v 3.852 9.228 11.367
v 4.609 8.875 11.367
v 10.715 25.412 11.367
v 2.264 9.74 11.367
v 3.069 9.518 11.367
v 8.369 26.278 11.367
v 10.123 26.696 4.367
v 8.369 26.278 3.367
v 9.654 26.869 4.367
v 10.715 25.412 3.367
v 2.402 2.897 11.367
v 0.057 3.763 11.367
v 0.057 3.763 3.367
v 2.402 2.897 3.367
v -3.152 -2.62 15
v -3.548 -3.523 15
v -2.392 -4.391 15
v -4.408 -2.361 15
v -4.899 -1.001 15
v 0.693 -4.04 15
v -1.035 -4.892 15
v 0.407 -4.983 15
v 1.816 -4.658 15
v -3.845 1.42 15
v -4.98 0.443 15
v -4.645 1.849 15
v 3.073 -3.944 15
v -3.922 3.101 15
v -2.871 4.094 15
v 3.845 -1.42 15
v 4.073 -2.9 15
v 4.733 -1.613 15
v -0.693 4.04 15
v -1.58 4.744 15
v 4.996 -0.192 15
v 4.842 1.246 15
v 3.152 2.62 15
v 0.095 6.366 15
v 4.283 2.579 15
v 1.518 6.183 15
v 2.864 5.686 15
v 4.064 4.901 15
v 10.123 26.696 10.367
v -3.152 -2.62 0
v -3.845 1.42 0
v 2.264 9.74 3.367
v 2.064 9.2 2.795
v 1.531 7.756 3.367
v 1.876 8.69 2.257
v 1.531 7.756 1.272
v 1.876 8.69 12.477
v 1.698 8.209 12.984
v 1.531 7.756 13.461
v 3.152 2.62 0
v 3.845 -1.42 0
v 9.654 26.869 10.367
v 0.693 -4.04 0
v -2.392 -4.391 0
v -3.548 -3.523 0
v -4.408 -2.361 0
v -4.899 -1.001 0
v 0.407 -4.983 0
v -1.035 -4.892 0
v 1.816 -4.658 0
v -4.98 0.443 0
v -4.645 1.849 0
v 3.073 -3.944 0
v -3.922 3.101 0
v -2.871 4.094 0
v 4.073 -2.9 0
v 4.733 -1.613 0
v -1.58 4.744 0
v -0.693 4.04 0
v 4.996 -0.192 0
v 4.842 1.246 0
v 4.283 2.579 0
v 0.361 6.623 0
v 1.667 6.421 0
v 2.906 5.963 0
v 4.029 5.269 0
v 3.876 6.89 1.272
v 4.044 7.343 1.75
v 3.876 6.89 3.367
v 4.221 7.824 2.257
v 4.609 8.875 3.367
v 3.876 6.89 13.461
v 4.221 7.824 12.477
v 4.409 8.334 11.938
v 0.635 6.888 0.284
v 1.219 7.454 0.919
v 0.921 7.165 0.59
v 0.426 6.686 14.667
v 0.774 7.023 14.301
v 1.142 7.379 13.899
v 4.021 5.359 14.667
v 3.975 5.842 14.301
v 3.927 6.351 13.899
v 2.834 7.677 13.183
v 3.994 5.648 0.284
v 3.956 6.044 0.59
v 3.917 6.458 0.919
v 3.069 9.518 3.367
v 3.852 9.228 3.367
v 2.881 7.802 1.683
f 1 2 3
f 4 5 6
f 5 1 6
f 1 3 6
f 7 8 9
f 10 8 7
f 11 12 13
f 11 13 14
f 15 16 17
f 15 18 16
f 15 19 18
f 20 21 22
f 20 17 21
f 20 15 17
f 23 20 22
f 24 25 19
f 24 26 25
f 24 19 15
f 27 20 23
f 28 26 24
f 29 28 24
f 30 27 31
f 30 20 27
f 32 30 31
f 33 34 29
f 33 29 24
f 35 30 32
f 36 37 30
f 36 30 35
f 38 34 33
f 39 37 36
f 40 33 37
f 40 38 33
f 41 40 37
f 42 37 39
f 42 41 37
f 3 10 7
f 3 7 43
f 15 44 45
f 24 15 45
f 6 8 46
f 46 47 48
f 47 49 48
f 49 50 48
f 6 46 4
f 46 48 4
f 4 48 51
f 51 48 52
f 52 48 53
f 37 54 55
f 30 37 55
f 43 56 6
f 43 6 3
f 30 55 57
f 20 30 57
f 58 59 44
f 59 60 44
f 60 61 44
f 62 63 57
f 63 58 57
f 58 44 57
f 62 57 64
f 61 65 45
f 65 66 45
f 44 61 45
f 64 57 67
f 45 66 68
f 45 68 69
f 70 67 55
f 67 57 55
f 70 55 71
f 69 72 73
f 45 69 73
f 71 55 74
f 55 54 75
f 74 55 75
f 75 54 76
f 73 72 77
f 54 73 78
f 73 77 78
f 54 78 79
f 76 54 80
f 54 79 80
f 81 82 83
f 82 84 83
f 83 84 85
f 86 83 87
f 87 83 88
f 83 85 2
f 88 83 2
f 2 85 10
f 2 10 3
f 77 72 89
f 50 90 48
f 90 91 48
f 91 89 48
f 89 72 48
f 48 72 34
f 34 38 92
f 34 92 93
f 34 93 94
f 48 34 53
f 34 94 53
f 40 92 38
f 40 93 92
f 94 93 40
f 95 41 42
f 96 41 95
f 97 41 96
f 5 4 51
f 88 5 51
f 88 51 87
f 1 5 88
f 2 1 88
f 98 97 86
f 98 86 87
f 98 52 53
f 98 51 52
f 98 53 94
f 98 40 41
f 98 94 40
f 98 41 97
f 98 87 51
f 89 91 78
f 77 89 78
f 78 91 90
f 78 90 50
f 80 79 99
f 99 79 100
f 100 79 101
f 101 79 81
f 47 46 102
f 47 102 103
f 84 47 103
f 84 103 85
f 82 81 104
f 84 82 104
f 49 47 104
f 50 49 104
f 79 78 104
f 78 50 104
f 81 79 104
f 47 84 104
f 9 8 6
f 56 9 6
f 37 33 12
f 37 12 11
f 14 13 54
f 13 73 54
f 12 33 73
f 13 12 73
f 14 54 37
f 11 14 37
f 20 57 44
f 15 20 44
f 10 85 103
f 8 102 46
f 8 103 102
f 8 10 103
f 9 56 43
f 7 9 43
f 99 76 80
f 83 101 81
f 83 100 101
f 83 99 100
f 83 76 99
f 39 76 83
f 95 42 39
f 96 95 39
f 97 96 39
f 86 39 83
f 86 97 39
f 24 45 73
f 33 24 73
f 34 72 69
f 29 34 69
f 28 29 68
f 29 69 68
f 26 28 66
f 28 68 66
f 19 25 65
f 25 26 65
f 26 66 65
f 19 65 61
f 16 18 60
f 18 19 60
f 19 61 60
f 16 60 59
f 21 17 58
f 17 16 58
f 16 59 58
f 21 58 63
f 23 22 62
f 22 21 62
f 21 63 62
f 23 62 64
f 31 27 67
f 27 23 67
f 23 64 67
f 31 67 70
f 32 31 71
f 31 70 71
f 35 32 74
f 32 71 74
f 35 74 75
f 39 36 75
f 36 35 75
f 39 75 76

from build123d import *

# Parameters (mm, degrees)
F0_R         = 5
F1_DEPTH     = 15
F2_W         = 2.5
F2_H         = 8
F3_DEPTH     = 25
F4_T1_DEPTH  = 8
F4_T6_ANGLE  = 323.6604372277
F4_T13_ANGLE = 323.6604372277
F4_T21_ANGLE = 323.6604372277
F4_T26_DEPTH = 15.8662197745
F4_T34_ANGLE = 323.6604372277
F4_T39_DEPTH = 15.8662197745
F4_T47_DEPTH = 15.8662197745
F4_T52_ANGLE = 323.6604372277
F4_T60_ANGLE = 323.6604372277
F4_T65_DEPTH = 15.8662197745
F5_SIZE      = 1


# Not quite as in the source:
# - a fillet or chamfer that OpenCascade refuses, or shapes differently, is made with other operations: its cross-section is extruded or revolved along the edge and cut away or added


with BuildPart() as f1:
    # F0 (on Top) → F1 (new body)
    with BuildSketch(Plane.XY):
        Circle(F0_R)
        Polygon((3.1522870356, 2.6203854256), (3.8454638641, -1.4197679401), (0.6931768285, -4.0401533656), (-3.1522870356, -2.6203854256), (-3.8454638641, 1.4197679401), (-0.6931768285, 4.0401533656), align=None, mode=Mode.SUBTRACT)
    extrude(amount=F1_DEPTH)

    # F2 (on face) → F3 (join)
    with BuildSketch(Plane(origin=(1.2295551036, 3.3302693956, 0), x_dir=(0.9381040551, -0.3463535503, 0), z_dir=(-0.3463535503, -0.9381040551, 0))):
        with Locations((0, 7.3666626269)):
            Rectangle(F2_W, F2_H)
    extrude(amount=-F3_DEPTH)

    # F4: chamfer of 5 on 4 edges, made by hand

    # F4_s2 → F4_t1 (join)
    with BuildSketch(Plane.XY.offset(3.3666626269)):
        with BuildLine():
            Line((-1.5797144045, 4.7438910612), (1.5310914666, 7.7560143709))
            Line((1.5310914666, 7.7560143709), (0.5041468464, 4.9745186659))
            ThreePointArc((0.5041468464, 4.9745186659), (-0.631305898, 4.9599851676), (-1.5797144045, 4.7438910612))
        make_face()
        with BuildLine():
            Line((4.2834359399, 2.5791813718), (3.8763516043, 6.8901304951))
            Line((3.8763516043, 6.8901304951), (2.8494069841, 4.1086347901))
            ThreePointArc((2.8494069841, 4.1086347901), (3.702995808, 3.359735413), (4.2834359399, 2.5791813718))
        make_face()
    extrude(amount=F4_T1_DEPTH)


with BuildPart() as f4_tool4:
    # F4_s5 → F4_t6 (revolve)
    with BuildSketch(Plane(origin=(0, 0, 0), x_dir=(0, 0, 1), z_dir=(0.7833222839, -0.6216157974, 0))):
        Polygon((16.3666626269, 5), (11.3666626269, 10), (11.3666626269, 5), align=None)
    revolve(axis=Axis((0, 0, 11.3666626269), (0, 0, -1)), revolution_arc=F4_T6_ANGLE)

    split(bisect_by=Plane.XY.offset(15), keep=Keep.BOTTOM)

    split(bisect_by=Plane(origin=(-1.1726300689, 0.4329419379, 0), x_dir=(0, 0, 1), z_dir=(0.9381040551, -0.3463535503, 0)), keep=Keep.TOP)

    split(bisect_by=Plane(origin=(1.1726300689, -0.4329419379, 0), x_dir=(0, 0, 1), z_dir=(-0.9381040551, 0.3463535503, 0)), keep=Keep.TOP)


with BuildPart() as f1_1:
    add(f1.part)

    # F4_t3: union F4_tool4
    add(f4_tool4.part)


with BuildPart() as f4_tool11:
    # F4_s12 → F4_t13 (revolve)
    with BuildSketch(Plane(origin=(0, 0, 0), x_dir=(0, 0, 1), z_dir=(0.7833222839, -0.6216157974, 0))):
        Polygon((-1.6333373731, 5), (3.3666626269, 10), (3.3666626269, 5), align=None)
    revolve(axis=Axis((0, 0, 3.3666626269), (0, 0, -1)), revolution_arc=F4_T13_ANGLE)

    split(bisect_by=Plane.XY, keep=Keep.TOP)

    split(bisect_by=Plane(origin=(-1.1726300689, 0.4329419379, 0), x_dir=(0, 0, 1), z_dir=(0.9381040551, -0.3463535503, 0)), keep=Keep.TOP)

    split(bisect_by=Plane(origin=(1.1726300689, -0.4329419379, 0), x_dir=(0, 0, 1), z_dir=(-0.9381040551, 0.3463535503, 0)), keep=Keep.TOP)


with BuildPart() as f1_2:
    add(f1_1.part)

    # F4_t10: union F4_tool11
    add(f4_tool11.part)


with BuildPart() as f4_tool19:
    # F4_s20 → F4_t21 (revolve)
    with BuildSketch(Plane(origin=(0, 0, 0), x_dir=(0, 0, 1), z_dir=(0.7833222839, -0.6216157974, 0))):
        Polygon((16.3666626269, 5), (11.3666626269, 10), (11.3666626269, 5), align=None)
    revolve(axis=Axis((0, 0, 11.3666626269), (0, 0, -1)), revolution_arc=F4_T21_ANGLE)

    split(bisect_by=Plane.XY.offset(15), keep=Keep.BOTTOM)

    split(bisect_by=Plane(origin=(-1.1726300689, 0.4329419379, 0), x_dir=(0, 0, 1), z_dir=(-0.9381040551, 0.3463535503, 0)), keep=Keep.TOP)


with BuildPart() as f4_tool24:
    # F4_s25 → F4_t26 (new body)
    with BuildSketch(Plane.XY.offset(19.2328824014)):
        with BuildLine():
            Line((-1.5797144045, 4.7438910612), (1.5310914666, 7.7560143709))
            Line((1.5310914666, 7.7560143709), (0.5041468464, 4.9745186659))
            ThreePointArc((0.5041468464, 4.9745186659), (-0.631305898, 4.9599851676), (-1.5797144045, 4.7438910612))
        make_face()
    extrude(amount=-F4_T26_DEPTH)

    split(bisect_by=Plane.XY.offset(15), keep=Keep.BOTTOM)

    split(bisect_by=Plane.XY.offset(11.3666626269), keep=Keep.TOP)


with BuildPart() as f4_tool19_1:
    add(f4_tool19.part)

    # F4_t29: intersect F4_tool24
    add(f4_tool24.part, mode=Mode.INTERSECT)


with BuildPart() as f1_3:
    add(f1_2.part)

    # F4_t17: union F4_tool19
    add(f4_tool19_1.part)


with BuildPart() as f4_tool32:
    # F4_s33 → F4_t34 (revolve)
    with BuildSketch(Plane(origin=(0, 0, 0), x_dir=(0, 0, 1), z_dir=(0.7833222839, -0.6216157974, 0))):
        Polygon((16.3666626269, 5), (11.3666626269, 10), (11.3666626269, 5), align=None)
    revolve(axis=Axis((0, 0, 11.3666626269), (0, 0, -1)), revolution_arc=F4_T34_ANGLE)

    split(bisect_by=Plane.XY.offset(15), keep=Keep.BOTTOM)

    split(bisect_by=Plane(origin=(1.1726300689, -0.4329419379, 0), x_dir=(0, 0, 1), z_dir=(0.9381040551, -0.3463535503, 0)), keep=Keep.TOP)


with BuildPart() as f4_tool37:
    # F4_s38 → F4_t39 (new body)
    with BuildSketch(Plane.XY.offset(19.2328824014)):
        with BuildLine():
            Line((4.2834359399, 2.5791813718), (3.8763516043, 6.8901304951))
            Line((3.8763516043, 6.8901304951), (2.8494069841, 4.1086347901))
            ThreePointArc((2.8494069841, 4.1086347901), (3.702995808, 3.359735413), (4.2834359399, 2.5791813718))
        make_face()
    extrude(amount=-F4_T39_DEPTH)

    split(bisect_by=Plane.XY.offset(15), keep=Keep.BOTTOM)

    split(bisect_by=Plane.XY.offset(11.3666626269), keep=Keep.TOP)


with BuildPart() as f4_tool32_1:
    add(f4_tool32.part)

    # F4_t42: intersect F4_tool37
    add(f4_tool37.part, mode=Mode.INTERSECT)


with BuildPart() as f1_4:
    add(f1_3.part)

    # F4_t30: union F4_tool32
    add(f4_tool32_1.part)


with BuildPart() as f4_tool45:
    # F4_s46 → F4_t47 (new body)
    with BuildSketch(Plane.XY.offset(11.3666626269)):
        with BuildLine():
            Line((-1.5797144045, 4.7438910612), (1.5310914666, 7.7560143709))
            Line((1.5310914666, 7.7560143709), (0.5041468464, 4.9745186659))
            ThreePointArc((0.5041468464, 4.9745186659), (-0.631305898, 4.9599851676), (-1.5797144045, 4.7438910612))
        make_face()
    extrude(amount=-F4_T47_DEPTH)

    split(bisect_by=Plane.XY, keep=Keep.TOP)

    split(bisect_by=Plane.XY.offset(3.3666626269), keep=Keep.BOTTOM)


with BuildPart() as f4_tool50:
    # F4_s51 → F4_t52 (revolve)
    with BuildSketch(Plane(origin=(0, 0, 0), x_dir=(0, 0, 1), z_dir=(0.7833222839, -0.6216157974, 0))):
        Polygon((-1.6333373731, 5), (3.3666626269, 10), (3.3666626269, 5), align=None)
    revolve(axis=Axis((0, 0, 3.3666626269), (0, 0, -1)), revolution_arc=F4_T52_ANGLE)

    split(bisect_by=Plane.XY, keep=Keep.TOP)

    split(bisect_by=Plane(origin=(-1.1726300689, 0.4329419379, 0), x_dir=(0, 0, 1), z_dir=(-0.9381040551, 0.3463535503, 0)), keep=Keep.TOP)


with BuildPart() as f4_tool45_1:
    add(f4_tool45.part)

    # F4_t55: intersect F4_tool50
    add(f4_tool50.part, mode=Mode.INTERSECT)


with BuildPart() as f1_5:
    add(f1_4.part)

    # F4_t43: union F4_tool45
    add(f4_tool45_1.part)


with BuildPart() as f4_tool58:
    # F4_s59 → F4_t60 (revolve)
    with BuildSketch(Plane(origin=(0, 0, 0), x_dir=(0, 0, 1), z_dir=(0.7833222839, -0.6216157974, 0))):
        Polygon((-1.6333373731, 5), (3.3666626269, 10), (3.3666626269, 5), align=None)
    revolve(axis=Axis((0, 0, 3.3666626269), (0, 0, -1)), revolution_arc=F4_T60_ANGLE)

    split(bisect_by=Plane.XY, keep=Keep.TOP)

    split(bisect_by=Plane(origin=(1.1726300689, -0.4329419379, 0), x_dir=(0, 0, 1), z_dir=(0.9381040551, -0.3463535503, 0)), keep=Keep.TOP)


with BuildPart() as f4_tool63:
    # F4_s64 → F4_t65 (new body)
    with BuildSketch(Plane.XY.offset(11.3666626269)):
        with BuildLine():
            Line((4.2834359399, 2.5791813718), (3.8763516043, 6.8901304951))
            Line((3.8763516043, 6.8901304951), (2.8494069841, 4.1086347901))
            ThreePointArc((2.8494069841, 4.1086347901), (3.702995808, 3.359735413), (4.2834359399, 2.5791813718))
        make_face()
    extrude(amount=-F4_T65_DEPTH)

    split(bisect_by=Plane.XY, keep=Keep.TOP)

    split(bisect_by=Plane.XY.offset(3.3666626269), keep=Keep.BOTTOM)


with BuildPart() as f4_tool58_1:
    add(f4_tool58.part)

    # F4_t68: intersect F4_tool63
    add(f4_tool63.part, mode=Mode.INTERSECT)


with BuildPart() as f1_6:
    add(f1_5.part)

    # F4_t56: union F4_tool58
    add(f4_tool58_1.part)

    # F5
    f5_edges = [f1_6.edges().sort_by_distance(p)[0] for p in [
        (11.061024, 26.349929, 7.366663),
        (9.888394, 26.782871, 11.366663),
        (8.715764, 27.215813, 7.366663),
        (9.888394, 26.782871, 3.366663),
    ]]
    chamfer(f5_edges, length=F5_SIZE)


solid = f1_6.part
